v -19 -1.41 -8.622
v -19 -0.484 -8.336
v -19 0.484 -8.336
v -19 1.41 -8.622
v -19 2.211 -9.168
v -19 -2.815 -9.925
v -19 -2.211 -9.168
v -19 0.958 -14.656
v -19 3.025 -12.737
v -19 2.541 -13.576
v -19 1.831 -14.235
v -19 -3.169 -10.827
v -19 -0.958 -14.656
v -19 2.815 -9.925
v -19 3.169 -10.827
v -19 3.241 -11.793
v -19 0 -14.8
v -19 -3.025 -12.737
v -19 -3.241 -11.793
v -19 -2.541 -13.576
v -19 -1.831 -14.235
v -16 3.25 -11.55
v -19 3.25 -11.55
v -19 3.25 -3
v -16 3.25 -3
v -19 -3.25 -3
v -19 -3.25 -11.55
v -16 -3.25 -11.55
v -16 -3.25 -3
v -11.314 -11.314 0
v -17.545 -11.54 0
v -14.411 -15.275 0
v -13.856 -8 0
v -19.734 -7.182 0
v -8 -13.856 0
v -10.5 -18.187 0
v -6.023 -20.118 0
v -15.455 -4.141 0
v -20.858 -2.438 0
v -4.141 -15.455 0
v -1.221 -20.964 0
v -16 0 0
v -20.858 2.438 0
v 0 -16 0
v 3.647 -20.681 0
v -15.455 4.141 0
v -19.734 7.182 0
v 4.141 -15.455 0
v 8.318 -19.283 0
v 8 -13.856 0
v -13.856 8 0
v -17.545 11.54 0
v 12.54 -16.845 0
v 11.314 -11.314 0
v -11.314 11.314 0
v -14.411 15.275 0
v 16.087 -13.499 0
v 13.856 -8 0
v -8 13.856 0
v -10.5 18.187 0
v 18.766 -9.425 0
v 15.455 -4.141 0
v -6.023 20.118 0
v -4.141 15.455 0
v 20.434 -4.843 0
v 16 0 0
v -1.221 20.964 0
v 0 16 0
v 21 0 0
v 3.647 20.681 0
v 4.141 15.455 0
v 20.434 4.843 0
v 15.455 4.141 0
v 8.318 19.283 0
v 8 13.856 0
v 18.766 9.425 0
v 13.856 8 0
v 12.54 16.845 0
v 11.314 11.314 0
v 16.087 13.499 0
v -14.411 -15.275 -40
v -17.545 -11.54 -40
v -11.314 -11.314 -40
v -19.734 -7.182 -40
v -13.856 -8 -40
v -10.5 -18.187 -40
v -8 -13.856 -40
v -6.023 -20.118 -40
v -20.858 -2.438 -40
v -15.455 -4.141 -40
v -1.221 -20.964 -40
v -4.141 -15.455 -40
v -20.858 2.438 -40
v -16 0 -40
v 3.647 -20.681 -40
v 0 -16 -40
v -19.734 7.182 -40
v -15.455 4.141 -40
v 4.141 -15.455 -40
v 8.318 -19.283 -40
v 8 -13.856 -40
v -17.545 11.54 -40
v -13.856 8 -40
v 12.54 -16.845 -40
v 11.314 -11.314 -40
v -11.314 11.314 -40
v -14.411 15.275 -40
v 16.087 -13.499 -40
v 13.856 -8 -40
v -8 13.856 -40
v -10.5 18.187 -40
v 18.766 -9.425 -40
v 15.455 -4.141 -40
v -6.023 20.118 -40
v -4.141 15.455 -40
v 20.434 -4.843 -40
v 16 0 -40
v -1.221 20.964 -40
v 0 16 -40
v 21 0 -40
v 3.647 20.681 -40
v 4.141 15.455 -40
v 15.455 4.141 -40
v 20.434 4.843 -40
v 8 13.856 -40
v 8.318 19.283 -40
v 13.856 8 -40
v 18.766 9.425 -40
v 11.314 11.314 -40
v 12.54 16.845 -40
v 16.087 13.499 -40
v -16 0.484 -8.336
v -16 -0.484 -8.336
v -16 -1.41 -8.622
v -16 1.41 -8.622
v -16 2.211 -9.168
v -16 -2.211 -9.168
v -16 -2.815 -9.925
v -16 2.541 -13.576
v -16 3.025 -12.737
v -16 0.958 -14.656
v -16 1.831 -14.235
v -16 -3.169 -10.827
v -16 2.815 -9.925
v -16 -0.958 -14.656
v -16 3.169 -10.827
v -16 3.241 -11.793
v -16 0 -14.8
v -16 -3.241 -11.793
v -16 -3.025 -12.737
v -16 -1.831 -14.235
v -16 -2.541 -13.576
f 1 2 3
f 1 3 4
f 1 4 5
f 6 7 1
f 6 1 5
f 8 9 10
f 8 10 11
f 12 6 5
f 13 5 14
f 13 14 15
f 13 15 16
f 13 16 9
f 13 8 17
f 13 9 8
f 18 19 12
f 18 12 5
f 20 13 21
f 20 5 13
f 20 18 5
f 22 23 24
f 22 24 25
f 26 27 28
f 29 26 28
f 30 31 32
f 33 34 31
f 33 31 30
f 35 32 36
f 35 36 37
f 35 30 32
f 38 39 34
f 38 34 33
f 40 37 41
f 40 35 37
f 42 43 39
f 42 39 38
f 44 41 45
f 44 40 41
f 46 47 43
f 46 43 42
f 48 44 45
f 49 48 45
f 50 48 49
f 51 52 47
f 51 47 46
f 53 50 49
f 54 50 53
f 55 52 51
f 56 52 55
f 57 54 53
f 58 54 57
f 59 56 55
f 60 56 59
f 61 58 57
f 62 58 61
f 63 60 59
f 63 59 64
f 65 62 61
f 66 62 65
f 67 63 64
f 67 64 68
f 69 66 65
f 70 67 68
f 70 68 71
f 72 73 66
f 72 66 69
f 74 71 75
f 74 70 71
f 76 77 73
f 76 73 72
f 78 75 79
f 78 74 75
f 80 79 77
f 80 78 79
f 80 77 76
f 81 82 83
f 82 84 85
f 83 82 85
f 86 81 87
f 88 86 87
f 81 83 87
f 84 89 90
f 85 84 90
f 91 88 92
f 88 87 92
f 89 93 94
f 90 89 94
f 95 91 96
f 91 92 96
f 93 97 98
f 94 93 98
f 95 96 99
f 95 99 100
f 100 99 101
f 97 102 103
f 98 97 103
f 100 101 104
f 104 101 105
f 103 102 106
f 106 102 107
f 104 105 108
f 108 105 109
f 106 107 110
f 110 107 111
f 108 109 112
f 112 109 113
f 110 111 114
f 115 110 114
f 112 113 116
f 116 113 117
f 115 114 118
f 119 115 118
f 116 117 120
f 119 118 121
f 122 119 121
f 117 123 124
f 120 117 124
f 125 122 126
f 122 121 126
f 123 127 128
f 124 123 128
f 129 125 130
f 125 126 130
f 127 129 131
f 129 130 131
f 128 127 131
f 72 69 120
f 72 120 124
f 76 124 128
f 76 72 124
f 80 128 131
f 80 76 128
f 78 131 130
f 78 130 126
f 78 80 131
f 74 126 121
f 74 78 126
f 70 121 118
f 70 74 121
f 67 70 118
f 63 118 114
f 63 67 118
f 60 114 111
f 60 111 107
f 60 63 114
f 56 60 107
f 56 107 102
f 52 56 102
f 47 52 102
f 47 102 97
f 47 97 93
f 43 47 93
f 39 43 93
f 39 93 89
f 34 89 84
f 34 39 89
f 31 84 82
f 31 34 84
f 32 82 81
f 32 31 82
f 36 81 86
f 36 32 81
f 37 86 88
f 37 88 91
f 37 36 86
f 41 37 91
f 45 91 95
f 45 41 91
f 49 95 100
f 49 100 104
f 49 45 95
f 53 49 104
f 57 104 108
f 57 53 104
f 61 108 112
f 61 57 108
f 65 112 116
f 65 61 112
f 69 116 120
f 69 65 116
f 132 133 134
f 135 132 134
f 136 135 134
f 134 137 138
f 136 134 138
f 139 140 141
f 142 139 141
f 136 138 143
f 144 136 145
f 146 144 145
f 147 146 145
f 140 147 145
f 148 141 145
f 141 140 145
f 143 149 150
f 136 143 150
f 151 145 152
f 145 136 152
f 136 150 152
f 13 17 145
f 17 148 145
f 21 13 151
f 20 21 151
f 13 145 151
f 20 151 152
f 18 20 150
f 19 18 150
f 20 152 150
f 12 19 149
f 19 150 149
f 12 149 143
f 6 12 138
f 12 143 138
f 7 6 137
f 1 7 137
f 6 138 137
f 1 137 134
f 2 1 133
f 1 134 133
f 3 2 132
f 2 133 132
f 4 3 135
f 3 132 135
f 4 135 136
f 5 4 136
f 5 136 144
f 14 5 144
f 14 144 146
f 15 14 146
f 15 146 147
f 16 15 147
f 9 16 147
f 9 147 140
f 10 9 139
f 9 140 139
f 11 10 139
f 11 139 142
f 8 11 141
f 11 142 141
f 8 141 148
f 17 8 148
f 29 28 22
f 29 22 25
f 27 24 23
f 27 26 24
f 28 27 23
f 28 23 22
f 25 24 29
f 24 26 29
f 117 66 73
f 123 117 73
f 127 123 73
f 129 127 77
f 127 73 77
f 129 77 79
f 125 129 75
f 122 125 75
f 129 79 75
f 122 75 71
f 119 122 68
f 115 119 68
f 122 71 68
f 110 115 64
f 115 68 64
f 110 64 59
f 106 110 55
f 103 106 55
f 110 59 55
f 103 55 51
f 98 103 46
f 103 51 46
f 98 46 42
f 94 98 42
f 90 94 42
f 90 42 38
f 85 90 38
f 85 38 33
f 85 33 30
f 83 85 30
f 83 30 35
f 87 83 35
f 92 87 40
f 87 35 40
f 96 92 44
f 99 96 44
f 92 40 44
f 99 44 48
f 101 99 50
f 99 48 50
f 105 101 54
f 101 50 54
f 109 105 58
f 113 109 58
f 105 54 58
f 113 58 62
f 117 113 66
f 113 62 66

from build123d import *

# Parameters (mm, degrees)
F0_R     = 21
F0_R_2   = 16
F1_DEPTH = 40
F2_W     = 3
F2_H     = 3.25
F2_H_2   = 5.3
F4_DEPTH = 3.25


with BuildPart() as f1:
    # F0 (on Top) → F1 (new body)
    with BuildSketch(Plane.XY):
        Circle(F0_R)
        Circle(F0_R_2, mode=Mode.SUBTRACT)
    extrude(amount=-F1_DEPTH)


with BuildPart() as f3:
    # F2 (on Front) → F3 (revolve)
    with BuildSketch(Plane.XZ):
        with Locations((-17.5, -13.175)):
            Rectangle(F2_W, F2_H)
    revolve(axis=Axis((-17.5, 0, -11.55), (-1, 0, 0)))


with BuildPart() as f4:
    # F2 (on Front) → F4 (new body, symmetric)
    with BuildSketch(Plane.XZ):
        with Locations((-17.5, -5.65)):
            Rectangle(F2_W, F2_H_2)
        with Locations((-17.5, -9.925)):
            Rectangle(F2_W, F2_H)
    extrude(amount=F4_DEPTH, both=True)


solid = Compound([f1.part, f3.part, f4.part])
